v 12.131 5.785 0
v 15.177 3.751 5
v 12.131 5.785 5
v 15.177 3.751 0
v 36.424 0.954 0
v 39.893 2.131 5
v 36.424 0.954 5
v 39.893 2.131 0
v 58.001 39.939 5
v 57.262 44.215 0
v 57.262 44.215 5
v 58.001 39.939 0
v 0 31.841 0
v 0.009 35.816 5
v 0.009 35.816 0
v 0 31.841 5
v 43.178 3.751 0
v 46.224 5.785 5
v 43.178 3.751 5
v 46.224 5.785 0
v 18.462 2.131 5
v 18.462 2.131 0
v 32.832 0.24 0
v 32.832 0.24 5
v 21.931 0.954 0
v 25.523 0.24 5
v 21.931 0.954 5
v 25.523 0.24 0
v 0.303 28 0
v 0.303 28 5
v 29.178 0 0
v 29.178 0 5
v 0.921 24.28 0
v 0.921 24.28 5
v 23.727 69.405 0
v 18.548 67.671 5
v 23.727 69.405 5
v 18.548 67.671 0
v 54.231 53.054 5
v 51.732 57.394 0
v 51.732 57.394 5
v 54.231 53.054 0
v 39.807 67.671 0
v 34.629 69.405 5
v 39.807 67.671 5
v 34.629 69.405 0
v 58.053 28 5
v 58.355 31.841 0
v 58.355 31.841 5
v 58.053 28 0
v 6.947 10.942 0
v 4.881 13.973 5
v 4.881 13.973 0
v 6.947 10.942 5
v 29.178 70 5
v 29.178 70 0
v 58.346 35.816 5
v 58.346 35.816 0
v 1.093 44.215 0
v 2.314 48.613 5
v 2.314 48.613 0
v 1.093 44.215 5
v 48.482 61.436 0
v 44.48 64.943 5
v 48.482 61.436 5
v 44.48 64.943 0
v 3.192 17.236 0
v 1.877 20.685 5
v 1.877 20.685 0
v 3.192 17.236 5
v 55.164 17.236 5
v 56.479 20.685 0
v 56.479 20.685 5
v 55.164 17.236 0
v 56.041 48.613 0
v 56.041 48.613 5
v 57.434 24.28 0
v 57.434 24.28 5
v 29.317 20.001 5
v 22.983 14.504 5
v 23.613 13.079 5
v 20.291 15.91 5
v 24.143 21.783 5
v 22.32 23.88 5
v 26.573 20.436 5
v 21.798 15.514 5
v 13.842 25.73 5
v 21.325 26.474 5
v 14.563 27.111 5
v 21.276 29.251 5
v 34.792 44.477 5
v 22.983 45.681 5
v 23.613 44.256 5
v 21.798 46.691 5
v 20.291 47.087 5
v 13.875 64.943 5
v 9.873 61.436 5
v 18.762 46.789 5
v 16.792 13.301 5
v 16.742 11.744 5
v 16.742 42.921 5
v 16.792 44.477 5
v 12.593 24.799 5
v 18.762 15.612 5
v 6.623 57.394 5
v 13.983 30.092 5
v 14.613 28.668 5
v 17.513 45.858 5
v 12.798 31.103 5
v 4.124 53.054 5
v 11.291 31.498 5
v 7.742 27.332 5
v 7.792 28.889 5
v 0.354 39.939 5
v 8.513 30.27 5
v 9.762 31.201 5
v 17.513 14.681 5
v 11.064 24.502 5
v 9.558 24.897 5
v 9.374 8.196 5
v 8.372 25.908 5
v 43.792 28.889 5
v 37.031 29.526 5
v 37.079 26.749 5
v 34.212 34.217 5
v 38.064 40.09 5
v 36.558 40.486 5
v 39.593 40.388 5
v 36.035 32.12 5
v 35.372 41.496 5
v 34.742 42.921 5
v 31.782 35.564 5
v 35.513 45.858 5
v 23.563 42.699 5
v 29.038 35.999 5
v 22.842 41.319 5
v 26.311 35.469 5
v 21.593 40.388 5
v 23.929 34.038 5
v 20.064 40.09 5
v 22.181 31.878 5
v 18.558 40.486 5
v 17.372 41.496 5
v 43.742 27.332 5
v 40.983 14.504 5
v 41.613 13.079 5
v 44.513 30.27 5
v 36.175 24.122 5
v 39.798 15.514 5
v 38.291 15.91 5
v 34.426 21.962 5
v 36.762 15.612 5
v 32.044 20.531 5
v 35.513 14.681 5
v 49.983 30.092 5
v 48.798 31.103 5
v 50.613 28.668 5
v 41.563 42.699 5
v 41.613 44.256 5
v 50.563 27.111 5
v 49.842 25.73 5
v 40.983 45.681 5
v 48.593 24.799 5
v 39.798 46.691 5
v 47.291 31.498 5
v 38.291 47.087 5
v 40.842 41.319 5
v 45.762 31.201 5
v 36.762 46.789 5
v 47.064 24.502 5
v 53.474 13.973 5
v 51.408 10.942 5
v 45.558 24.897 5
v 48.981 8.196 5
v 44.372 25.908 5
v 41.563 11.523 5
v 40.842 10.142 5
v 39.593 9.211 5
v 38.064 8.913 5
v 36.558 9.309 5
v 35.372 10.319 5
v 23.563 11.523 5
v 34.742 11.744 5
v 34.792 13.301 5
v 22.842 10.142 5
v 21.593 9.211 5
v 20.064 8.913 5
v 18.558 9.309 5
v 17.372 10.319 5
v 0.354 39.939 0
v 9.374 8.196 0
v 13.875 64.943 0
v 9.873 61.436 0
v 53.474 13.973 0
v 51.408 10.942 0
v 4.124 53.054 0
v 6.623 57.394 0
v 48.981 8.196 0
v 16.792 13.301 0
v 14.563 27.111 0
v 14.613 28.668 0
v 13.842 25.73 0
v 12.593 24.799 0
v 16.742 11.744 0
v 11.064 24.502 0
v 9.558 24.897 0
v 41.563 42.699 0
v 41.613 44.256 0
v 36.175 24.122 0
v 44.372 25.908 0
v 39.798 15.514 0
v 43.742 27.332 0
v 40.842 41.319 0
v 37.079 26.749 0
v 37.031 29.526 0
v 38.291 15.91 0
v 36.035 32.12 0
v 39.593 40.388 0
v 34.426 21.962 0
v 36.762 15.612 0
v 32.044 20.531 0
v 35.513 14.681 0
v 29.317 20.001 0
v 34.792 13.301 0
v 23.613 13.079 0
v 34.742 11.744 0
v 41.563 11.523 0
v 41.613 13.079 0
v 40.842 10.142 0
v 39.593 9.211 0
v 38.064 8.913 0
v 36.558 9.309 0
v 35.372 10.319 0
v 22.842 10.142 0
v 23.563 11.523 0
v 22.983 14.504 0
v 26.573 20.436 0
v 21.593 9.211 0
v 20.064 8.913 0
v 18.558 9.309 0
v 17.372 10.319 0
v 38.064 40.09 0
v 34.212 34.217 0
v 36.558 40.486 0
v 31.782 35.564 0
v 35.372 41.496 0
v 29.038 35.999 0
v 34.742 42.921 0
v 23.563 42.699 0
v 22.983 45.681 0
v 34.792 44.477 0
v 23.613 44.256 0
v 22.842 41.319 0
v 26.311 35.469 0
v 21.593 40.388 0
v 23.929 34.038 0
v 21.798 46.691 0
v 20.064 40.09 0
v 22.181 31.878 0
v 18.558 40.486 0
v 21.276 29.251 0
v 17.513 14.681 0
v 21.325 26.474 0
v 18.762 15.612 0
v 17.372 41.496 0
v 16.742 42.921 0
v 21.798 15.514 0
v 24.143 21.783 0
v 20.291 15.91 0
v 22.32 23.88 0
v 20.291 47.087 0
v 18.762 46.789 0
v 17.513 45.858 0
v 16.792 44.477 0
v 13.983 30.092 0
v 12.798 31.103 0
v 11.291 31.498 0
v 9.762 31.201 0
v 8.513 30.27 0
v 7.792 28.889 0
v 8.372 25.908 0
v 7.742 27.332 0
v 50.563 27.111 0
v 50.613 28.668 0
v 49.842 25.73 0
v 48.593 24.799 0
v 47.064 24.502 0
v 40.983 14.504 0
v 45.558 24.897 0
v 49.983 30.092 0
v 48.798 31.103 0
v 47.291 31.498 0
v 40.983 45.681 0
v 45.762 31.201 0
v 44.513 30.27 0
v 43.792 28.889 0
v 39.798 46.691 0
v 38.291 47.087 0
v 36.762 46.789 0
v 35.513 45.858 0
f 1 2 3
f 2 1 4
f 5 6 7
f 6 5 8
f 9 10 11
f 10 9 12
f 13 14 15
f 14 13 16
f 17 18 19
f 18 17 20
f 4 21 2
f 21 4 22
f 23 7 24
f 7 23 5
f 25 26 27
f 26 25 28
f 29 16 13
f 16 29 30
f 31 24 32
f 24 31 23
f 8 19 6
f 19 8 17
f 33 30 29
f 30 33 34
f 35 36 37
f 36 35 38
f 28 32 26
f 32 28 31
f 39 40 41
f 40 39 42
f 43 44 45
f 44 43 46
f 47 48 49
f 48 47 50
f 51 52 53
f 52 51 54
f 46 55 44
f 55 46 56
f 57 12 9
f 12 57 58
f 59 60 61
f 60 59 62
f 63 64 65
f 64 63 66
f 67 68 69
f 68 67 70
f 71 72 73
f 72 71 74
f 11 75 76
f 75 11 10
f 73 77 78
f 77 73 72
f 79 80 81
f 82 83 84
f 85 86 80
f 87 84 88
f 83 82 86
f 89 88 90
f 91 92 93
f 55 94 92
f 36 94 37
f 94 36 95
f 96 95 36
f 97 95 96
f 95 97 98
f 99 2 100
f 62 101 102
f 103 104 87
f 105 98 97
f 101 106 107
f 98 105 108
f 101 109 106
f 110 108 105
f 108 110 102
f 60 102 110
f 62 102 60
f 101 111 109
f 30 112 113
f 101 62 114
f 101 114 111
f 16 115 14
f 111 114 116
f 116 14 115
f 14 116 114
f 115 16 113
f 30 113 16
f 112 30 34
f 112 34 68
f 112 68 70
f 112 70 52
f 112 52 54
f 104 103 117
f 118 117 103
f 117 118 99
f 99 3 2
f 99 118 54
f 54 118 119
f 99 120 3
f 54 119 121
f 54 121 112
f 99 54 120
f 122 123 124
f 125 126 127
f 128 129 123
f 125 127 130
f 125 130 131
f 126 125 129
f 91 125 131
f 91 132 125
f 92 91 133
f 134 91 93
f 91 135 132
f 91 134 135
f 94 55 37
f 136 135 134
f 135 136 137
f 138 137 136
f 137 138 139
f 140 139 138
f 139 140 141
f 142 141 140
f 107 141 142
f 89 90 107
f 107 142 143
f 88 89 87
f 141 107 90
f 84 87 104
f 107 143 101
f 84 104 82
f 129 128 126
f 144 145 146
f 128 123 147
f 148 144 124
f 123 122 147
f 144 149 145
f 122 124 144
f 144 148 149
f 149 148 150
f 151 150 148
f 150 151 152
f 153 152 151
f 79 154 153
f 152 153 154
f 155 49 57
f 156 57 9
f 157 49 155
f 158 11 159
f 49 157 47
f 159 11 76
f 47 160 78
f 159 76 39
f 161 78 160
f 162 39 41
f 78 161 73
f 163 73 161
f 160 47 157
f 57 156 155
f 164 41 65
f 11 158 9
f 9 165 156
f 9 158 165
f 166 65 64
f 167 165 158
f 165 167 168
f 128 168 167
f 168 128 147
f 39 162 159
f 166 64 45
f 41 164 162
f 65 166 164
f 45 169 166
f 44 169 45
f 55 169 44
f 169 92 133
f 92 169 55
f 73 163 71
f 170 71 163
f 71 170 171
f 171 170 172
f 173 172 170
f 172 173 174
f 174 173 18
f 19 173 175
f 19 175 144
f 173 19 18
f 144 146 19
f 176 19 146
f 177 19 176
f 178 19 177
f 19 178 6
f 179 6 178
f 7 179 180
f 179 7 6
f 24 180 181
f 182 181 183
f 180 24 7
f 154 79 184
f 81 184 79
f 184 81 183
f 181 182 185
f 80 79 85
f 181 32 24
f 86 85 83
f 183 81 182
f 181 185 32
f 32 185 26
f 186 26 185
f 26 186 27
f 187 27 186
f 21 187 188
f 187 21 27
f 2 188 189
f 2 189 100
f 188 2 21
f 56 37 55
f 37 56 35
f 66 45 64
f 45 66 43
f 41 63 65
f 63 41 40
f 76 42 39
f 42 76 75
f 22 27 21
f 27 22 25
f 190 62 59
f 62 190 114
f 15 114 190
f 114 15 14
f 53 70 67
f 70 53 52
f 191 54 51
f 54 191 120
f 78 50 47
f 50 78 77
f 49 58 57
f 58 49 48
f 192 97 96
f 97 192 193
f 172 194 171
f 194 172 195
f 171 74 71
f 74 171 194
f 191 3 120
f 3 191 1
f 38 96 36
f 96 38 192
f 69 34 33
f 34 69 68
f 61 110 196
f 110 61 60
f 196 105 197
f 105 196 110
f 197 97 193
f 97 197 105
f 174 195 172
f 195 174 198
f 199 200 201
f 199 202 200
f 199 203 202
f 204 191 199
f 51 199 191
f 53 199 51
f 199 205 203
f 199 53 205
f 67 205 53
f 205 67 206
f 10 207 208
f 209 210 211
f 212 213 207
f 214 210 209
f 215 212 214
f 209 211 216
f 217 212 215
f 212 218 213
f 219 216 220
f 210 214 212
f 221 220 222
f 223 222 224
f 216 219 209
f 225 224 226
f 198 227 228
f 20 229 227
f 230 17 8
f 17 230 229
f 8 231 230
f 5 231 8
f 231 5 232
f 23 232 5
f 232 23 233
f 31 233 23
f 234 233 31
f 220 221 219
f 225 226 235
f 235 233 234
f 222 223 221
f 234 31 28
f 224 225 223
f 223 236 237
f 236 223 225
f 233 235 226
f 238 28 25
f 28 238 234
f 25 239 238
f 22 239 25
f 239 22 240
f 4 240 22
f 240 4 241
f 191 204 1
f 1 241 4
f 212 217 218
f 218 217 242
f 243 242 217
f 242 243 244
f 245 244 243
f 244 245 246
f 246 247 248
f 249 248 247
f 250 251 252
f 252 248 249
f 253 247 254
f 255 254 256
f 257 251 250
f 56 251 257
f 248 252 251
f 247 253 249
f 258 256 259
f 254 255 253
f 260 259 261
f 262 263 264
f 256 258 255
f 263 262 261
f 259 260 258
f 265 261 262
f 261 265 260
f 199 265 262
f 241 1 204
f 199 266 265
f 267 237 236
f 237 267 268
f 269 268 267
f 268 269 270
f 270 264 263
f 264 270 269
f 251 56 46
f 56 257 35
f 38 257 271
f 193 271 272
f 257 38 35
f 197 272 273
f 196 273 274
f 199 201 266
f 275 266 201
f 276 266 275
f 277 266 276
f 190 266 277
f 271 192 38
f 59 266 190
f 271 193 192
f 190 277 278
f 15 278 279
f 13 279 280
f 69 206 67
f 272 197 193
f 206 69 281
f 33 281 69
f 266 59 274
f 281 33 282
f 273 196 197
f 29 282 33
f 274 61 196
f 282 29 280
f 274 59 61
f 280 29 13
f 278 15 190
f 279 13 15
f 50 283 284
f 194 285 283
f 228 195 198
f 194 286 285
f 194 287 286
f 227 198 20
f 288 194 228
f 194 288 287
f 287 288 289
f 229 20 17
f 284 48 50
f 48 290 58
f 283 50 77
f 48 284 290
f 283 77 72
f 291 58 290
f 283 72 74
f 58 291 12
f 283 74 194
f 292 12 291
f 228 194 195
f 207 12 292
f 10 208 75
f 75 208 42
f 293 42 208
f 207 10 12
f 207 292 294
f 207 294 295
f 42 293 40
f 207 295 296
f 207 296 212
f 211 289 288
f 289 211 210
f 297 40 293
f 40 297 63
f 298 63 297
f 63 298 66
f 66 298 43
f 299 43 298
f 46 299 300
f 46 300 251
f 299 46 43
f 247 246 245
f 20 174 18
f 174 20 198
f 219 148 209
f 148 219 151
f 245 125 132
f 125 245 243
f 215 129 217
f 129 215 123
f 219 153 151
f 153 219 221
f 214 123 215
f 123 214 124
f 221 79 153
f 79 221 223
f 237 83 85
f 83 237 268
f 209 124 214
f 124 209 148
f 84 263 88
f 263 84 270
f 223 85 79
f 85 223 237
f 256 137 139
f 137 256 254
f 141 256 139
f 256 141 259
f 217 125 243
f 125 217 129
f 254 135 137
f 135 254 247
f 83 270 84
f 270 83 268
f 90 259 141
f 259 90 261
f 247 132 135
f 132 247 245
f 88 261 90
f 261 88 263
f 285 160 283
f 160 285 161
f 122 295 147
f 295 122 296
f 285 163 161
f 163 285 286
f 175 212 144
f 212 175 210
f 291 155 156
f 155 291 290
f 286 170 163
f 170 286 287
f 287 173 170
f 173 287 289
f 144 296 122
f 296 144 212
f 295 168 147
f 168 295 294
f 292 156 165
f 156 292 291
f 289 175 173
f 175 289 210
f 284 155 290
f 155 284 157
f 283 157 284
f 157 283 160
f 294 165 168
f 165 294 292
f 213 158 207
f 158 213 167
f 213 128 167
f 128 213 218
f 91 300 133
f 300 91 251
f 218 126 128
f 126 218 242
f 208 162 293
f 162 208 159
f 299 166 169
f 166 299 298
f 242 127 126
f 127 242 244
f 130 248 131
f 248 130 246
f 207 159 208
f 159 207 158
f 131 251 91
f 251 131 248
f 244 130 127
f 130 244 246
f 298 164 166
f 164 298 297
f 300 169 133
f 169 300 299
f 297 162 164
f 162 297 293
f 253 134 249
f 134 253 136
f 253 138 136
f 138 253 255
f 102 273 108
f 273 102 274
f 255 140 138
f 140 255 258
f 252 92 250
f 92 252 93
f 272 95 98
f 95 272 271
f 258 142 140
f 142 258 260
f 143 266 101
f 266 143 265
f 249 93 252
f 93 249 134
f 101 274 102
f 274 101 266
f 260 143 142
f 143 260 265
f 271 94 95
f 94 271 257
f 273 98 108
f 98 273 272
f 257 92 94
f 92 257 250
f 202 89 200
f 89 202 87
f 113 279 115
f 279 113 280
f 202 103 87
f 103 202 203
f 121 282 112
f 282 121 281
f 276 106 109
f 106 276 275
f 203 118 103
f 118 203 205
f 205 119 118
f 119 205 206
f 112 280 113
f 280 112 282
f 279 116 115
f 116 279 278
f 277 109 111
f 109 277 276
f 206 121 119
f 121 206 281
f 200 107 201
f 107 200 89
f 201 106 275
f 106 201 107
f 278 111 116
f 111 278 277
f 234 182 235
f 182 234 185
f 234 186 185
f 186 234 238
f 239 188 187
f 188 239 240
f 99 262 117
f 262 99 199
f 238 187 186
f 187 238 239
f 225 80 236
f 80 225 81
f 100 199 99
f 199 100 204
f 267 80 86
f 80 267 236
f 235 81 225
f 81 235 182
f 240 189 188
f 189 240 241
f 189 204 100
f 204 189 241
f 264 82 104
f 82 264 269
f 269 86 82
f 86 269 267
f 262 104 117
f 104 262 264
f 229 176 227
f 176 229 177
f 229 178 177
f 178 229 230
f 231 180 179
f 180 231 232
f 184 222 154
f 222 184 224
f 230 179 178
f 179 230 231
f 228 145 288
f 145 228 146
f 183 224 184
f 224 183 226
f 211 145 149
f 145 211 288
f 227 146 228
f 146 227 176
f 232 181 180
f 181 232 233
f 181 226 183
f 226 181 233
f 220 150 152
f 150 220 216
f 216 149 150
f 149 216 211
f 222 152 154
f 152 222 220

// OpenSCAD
$fn = 32;

// ----------------------------------------------------------------------
// Cam plate: single_lobe cam, base R28
// ----------------------------------------------------------------------

// --- parameters (mm) ---
base_r = 28;              // base circle radius
lobe_h = 14;              // cam lobe rise
bore_r = 8;               // shaft bore radius
plate_t = 5;              // plate thickness, Z (extrusion height)
ring_r = 18;              // lightening ring radius
bolt_r = 3.5;             // lightening hole radius

profile = [[58.053, 28], [58.355, 31.841], [58.346, 35.816], [58.001, 39.939], [57.262, 44.215], [56.041, 48.613], [54.231, 53.054], [51.732, 57.394], [48.482, 61.436], [44.48, 64.943], [39.807, 67.671], [34.629, 69.405], [29.178, 70], [23.727, 69.405], [18.548, 67.671], [13.875, 64.943], [9.873, 61.436], [6.623, 57.394], [4.124, 53.054], [2.314, 48.613], [1.093, 44.215], [0.354, 39.939], [0.009, 35.816], [0, 31.841], [0.303, 28], [0.921, 24.28], [1.877, 20.685], [3.192, 17.236], [4.881, 13.973], [6.947, 10.942], [9.374, 8.196], [12.131, 5.785], [15.177, 3.751], [18.462, 2.131], [21.931, 0.954], [25.523, 0.24], [29.178, 0], [32.832, 0.24], [36.424, 0.954], [39.893, 2.131], [43.178, 3.751], [46.224, 5.785], [48.981, 8.196], [51.408, 10.942], [53.474, 13.973], [55.164, 17.236], [56.479, 20.685], [57.434, 24.28]];  // primary outline, 48 points, counter clockwise
void_1 = [[37.031, 29.526], [36.035, 32.12], [34.212, 34.217], [31.782, 35.564], [29.038, 35.999], [26.311, 35.469], [23.929, 34.038], [22.181, 31.878], [21.276, 29.251], [21.325, 26.474], [22.32, 23.88], [24.143, 21.783], [26.573, 20.436], [29.317, 20.001], [32.044, 20.531], [34.426, 21.962], [36.175, 24.122], [37.079, 26.749]];  // shaft bore, 18 points
void_2 = [[50.613, 28.668], [49.983, 30.092], [48.798, 31.103], [47.291, 31.498], [45.762, 31.201], [44.513, 30.27], [43.792, 28.889], [43.742, 27.332], [44.372, 25.908], [45.558, 24.897], [47.064, 24.502], [48.593, 24.799], [49.842, 25.73], [50.563, 27.111]];  // lightening hole 1, 14 points
void_3 = [[41.613, 44.256], [40.983, 45.681], [39.798, 46.691], [38.291, 47.087], [36.762, 46.789], [35.513, 45.858], [34.792, 44.477], [34.742, 42.921], [35.372, 41.496], [36.558, 40.486], [38.064, 40.09], [39.593, 40.388], [40.842, 41.319], [41.563, 42.699]];  // lightening hole 2, 14 points
void_4 = [[23.613, 44.256], [22.983, 45.681], [21.798, 46.691], [20.291, 47.087], [18.762, 46.789], [17.513, 45.858], [16.792, 44.477], [16.742, 42.921], [17.372, 41.496], [18.558, 40.486], [20.064, 40.09], [21.593, 40.388], [22.842, 41.319], [23.563, 42.699]];  // lightening hole 3, 14 points
void_5 = [[14.613, 28.668], [13.983, 30.092], [12.798, 31.103], [11.291, 31.498], [9.762, 31.201], [8.513, 30.27], [7.792, 28.889], [7.742, 27.332], [8.372, 25.908], [9.558, 24.897], [11.064, 24.502], [12.593, 24.799], [13.842, 25.73], [14.563, 27.111]];  // lightening hole 4, 14 points
void_6 = [[23.613, 13.079], [22.983, 14.504], [21.798, 15.514], [20.291, 15.91], [18.762, 15.612], [17.513, 14.681], [16.792, 13.301], [16.742, 11.744], [17.372, 10.319], [18.558, 9.309], [20.064, 8.913], [21.593, 9.211], [22.842, 10.142], [23.563, 11.523]];  // lightening hole 5, 14 points
void_7 = [[41.613, 13.079], [40.983, 14.504], [39.798, 15.514], [38.291, 15.91], [36.762, 15.612], [35.513, 14.681], [34.792, 13.301], [34.742, 11.744], [35.372, 10.319], [36.558, 9.309], [38.064, 8.913], [39.593, 9.211], [40.842, 10.142], [41.563, 11.523]];  // lightening hole 6, 14 points

// --- the one profile operation ---
difference() {
  linear_extrude(height = plate_t) polygon(points = profile);
  translate([0, 0, -1])
    linear_extrude(height = plate_t + 2) polygon(points = void_1);
  translate([0, 0, -1])
    linear_extrude(height = plate_t + 2) polygon(points = void_2);
  translate([0, 0, -1])
    linear_extrude(height = plate_t + 2) polygon(points = void_3);
  translate([0, 0, -1])
    linear_extrude(height = plate_t + 2) polygon(points = void_4);
  translate([0, 0, -1])
    linear_extrude(height = plate_t + 2) polygon(points = void_5);
  translate([0, 0, -1])
    linear_extrude(height = plate_t + 2) polygon(points = void_6);
  translate([0, 0, -1])
    linear_extrude(height = plate_t + 2) polygon(points = void_7);
}
